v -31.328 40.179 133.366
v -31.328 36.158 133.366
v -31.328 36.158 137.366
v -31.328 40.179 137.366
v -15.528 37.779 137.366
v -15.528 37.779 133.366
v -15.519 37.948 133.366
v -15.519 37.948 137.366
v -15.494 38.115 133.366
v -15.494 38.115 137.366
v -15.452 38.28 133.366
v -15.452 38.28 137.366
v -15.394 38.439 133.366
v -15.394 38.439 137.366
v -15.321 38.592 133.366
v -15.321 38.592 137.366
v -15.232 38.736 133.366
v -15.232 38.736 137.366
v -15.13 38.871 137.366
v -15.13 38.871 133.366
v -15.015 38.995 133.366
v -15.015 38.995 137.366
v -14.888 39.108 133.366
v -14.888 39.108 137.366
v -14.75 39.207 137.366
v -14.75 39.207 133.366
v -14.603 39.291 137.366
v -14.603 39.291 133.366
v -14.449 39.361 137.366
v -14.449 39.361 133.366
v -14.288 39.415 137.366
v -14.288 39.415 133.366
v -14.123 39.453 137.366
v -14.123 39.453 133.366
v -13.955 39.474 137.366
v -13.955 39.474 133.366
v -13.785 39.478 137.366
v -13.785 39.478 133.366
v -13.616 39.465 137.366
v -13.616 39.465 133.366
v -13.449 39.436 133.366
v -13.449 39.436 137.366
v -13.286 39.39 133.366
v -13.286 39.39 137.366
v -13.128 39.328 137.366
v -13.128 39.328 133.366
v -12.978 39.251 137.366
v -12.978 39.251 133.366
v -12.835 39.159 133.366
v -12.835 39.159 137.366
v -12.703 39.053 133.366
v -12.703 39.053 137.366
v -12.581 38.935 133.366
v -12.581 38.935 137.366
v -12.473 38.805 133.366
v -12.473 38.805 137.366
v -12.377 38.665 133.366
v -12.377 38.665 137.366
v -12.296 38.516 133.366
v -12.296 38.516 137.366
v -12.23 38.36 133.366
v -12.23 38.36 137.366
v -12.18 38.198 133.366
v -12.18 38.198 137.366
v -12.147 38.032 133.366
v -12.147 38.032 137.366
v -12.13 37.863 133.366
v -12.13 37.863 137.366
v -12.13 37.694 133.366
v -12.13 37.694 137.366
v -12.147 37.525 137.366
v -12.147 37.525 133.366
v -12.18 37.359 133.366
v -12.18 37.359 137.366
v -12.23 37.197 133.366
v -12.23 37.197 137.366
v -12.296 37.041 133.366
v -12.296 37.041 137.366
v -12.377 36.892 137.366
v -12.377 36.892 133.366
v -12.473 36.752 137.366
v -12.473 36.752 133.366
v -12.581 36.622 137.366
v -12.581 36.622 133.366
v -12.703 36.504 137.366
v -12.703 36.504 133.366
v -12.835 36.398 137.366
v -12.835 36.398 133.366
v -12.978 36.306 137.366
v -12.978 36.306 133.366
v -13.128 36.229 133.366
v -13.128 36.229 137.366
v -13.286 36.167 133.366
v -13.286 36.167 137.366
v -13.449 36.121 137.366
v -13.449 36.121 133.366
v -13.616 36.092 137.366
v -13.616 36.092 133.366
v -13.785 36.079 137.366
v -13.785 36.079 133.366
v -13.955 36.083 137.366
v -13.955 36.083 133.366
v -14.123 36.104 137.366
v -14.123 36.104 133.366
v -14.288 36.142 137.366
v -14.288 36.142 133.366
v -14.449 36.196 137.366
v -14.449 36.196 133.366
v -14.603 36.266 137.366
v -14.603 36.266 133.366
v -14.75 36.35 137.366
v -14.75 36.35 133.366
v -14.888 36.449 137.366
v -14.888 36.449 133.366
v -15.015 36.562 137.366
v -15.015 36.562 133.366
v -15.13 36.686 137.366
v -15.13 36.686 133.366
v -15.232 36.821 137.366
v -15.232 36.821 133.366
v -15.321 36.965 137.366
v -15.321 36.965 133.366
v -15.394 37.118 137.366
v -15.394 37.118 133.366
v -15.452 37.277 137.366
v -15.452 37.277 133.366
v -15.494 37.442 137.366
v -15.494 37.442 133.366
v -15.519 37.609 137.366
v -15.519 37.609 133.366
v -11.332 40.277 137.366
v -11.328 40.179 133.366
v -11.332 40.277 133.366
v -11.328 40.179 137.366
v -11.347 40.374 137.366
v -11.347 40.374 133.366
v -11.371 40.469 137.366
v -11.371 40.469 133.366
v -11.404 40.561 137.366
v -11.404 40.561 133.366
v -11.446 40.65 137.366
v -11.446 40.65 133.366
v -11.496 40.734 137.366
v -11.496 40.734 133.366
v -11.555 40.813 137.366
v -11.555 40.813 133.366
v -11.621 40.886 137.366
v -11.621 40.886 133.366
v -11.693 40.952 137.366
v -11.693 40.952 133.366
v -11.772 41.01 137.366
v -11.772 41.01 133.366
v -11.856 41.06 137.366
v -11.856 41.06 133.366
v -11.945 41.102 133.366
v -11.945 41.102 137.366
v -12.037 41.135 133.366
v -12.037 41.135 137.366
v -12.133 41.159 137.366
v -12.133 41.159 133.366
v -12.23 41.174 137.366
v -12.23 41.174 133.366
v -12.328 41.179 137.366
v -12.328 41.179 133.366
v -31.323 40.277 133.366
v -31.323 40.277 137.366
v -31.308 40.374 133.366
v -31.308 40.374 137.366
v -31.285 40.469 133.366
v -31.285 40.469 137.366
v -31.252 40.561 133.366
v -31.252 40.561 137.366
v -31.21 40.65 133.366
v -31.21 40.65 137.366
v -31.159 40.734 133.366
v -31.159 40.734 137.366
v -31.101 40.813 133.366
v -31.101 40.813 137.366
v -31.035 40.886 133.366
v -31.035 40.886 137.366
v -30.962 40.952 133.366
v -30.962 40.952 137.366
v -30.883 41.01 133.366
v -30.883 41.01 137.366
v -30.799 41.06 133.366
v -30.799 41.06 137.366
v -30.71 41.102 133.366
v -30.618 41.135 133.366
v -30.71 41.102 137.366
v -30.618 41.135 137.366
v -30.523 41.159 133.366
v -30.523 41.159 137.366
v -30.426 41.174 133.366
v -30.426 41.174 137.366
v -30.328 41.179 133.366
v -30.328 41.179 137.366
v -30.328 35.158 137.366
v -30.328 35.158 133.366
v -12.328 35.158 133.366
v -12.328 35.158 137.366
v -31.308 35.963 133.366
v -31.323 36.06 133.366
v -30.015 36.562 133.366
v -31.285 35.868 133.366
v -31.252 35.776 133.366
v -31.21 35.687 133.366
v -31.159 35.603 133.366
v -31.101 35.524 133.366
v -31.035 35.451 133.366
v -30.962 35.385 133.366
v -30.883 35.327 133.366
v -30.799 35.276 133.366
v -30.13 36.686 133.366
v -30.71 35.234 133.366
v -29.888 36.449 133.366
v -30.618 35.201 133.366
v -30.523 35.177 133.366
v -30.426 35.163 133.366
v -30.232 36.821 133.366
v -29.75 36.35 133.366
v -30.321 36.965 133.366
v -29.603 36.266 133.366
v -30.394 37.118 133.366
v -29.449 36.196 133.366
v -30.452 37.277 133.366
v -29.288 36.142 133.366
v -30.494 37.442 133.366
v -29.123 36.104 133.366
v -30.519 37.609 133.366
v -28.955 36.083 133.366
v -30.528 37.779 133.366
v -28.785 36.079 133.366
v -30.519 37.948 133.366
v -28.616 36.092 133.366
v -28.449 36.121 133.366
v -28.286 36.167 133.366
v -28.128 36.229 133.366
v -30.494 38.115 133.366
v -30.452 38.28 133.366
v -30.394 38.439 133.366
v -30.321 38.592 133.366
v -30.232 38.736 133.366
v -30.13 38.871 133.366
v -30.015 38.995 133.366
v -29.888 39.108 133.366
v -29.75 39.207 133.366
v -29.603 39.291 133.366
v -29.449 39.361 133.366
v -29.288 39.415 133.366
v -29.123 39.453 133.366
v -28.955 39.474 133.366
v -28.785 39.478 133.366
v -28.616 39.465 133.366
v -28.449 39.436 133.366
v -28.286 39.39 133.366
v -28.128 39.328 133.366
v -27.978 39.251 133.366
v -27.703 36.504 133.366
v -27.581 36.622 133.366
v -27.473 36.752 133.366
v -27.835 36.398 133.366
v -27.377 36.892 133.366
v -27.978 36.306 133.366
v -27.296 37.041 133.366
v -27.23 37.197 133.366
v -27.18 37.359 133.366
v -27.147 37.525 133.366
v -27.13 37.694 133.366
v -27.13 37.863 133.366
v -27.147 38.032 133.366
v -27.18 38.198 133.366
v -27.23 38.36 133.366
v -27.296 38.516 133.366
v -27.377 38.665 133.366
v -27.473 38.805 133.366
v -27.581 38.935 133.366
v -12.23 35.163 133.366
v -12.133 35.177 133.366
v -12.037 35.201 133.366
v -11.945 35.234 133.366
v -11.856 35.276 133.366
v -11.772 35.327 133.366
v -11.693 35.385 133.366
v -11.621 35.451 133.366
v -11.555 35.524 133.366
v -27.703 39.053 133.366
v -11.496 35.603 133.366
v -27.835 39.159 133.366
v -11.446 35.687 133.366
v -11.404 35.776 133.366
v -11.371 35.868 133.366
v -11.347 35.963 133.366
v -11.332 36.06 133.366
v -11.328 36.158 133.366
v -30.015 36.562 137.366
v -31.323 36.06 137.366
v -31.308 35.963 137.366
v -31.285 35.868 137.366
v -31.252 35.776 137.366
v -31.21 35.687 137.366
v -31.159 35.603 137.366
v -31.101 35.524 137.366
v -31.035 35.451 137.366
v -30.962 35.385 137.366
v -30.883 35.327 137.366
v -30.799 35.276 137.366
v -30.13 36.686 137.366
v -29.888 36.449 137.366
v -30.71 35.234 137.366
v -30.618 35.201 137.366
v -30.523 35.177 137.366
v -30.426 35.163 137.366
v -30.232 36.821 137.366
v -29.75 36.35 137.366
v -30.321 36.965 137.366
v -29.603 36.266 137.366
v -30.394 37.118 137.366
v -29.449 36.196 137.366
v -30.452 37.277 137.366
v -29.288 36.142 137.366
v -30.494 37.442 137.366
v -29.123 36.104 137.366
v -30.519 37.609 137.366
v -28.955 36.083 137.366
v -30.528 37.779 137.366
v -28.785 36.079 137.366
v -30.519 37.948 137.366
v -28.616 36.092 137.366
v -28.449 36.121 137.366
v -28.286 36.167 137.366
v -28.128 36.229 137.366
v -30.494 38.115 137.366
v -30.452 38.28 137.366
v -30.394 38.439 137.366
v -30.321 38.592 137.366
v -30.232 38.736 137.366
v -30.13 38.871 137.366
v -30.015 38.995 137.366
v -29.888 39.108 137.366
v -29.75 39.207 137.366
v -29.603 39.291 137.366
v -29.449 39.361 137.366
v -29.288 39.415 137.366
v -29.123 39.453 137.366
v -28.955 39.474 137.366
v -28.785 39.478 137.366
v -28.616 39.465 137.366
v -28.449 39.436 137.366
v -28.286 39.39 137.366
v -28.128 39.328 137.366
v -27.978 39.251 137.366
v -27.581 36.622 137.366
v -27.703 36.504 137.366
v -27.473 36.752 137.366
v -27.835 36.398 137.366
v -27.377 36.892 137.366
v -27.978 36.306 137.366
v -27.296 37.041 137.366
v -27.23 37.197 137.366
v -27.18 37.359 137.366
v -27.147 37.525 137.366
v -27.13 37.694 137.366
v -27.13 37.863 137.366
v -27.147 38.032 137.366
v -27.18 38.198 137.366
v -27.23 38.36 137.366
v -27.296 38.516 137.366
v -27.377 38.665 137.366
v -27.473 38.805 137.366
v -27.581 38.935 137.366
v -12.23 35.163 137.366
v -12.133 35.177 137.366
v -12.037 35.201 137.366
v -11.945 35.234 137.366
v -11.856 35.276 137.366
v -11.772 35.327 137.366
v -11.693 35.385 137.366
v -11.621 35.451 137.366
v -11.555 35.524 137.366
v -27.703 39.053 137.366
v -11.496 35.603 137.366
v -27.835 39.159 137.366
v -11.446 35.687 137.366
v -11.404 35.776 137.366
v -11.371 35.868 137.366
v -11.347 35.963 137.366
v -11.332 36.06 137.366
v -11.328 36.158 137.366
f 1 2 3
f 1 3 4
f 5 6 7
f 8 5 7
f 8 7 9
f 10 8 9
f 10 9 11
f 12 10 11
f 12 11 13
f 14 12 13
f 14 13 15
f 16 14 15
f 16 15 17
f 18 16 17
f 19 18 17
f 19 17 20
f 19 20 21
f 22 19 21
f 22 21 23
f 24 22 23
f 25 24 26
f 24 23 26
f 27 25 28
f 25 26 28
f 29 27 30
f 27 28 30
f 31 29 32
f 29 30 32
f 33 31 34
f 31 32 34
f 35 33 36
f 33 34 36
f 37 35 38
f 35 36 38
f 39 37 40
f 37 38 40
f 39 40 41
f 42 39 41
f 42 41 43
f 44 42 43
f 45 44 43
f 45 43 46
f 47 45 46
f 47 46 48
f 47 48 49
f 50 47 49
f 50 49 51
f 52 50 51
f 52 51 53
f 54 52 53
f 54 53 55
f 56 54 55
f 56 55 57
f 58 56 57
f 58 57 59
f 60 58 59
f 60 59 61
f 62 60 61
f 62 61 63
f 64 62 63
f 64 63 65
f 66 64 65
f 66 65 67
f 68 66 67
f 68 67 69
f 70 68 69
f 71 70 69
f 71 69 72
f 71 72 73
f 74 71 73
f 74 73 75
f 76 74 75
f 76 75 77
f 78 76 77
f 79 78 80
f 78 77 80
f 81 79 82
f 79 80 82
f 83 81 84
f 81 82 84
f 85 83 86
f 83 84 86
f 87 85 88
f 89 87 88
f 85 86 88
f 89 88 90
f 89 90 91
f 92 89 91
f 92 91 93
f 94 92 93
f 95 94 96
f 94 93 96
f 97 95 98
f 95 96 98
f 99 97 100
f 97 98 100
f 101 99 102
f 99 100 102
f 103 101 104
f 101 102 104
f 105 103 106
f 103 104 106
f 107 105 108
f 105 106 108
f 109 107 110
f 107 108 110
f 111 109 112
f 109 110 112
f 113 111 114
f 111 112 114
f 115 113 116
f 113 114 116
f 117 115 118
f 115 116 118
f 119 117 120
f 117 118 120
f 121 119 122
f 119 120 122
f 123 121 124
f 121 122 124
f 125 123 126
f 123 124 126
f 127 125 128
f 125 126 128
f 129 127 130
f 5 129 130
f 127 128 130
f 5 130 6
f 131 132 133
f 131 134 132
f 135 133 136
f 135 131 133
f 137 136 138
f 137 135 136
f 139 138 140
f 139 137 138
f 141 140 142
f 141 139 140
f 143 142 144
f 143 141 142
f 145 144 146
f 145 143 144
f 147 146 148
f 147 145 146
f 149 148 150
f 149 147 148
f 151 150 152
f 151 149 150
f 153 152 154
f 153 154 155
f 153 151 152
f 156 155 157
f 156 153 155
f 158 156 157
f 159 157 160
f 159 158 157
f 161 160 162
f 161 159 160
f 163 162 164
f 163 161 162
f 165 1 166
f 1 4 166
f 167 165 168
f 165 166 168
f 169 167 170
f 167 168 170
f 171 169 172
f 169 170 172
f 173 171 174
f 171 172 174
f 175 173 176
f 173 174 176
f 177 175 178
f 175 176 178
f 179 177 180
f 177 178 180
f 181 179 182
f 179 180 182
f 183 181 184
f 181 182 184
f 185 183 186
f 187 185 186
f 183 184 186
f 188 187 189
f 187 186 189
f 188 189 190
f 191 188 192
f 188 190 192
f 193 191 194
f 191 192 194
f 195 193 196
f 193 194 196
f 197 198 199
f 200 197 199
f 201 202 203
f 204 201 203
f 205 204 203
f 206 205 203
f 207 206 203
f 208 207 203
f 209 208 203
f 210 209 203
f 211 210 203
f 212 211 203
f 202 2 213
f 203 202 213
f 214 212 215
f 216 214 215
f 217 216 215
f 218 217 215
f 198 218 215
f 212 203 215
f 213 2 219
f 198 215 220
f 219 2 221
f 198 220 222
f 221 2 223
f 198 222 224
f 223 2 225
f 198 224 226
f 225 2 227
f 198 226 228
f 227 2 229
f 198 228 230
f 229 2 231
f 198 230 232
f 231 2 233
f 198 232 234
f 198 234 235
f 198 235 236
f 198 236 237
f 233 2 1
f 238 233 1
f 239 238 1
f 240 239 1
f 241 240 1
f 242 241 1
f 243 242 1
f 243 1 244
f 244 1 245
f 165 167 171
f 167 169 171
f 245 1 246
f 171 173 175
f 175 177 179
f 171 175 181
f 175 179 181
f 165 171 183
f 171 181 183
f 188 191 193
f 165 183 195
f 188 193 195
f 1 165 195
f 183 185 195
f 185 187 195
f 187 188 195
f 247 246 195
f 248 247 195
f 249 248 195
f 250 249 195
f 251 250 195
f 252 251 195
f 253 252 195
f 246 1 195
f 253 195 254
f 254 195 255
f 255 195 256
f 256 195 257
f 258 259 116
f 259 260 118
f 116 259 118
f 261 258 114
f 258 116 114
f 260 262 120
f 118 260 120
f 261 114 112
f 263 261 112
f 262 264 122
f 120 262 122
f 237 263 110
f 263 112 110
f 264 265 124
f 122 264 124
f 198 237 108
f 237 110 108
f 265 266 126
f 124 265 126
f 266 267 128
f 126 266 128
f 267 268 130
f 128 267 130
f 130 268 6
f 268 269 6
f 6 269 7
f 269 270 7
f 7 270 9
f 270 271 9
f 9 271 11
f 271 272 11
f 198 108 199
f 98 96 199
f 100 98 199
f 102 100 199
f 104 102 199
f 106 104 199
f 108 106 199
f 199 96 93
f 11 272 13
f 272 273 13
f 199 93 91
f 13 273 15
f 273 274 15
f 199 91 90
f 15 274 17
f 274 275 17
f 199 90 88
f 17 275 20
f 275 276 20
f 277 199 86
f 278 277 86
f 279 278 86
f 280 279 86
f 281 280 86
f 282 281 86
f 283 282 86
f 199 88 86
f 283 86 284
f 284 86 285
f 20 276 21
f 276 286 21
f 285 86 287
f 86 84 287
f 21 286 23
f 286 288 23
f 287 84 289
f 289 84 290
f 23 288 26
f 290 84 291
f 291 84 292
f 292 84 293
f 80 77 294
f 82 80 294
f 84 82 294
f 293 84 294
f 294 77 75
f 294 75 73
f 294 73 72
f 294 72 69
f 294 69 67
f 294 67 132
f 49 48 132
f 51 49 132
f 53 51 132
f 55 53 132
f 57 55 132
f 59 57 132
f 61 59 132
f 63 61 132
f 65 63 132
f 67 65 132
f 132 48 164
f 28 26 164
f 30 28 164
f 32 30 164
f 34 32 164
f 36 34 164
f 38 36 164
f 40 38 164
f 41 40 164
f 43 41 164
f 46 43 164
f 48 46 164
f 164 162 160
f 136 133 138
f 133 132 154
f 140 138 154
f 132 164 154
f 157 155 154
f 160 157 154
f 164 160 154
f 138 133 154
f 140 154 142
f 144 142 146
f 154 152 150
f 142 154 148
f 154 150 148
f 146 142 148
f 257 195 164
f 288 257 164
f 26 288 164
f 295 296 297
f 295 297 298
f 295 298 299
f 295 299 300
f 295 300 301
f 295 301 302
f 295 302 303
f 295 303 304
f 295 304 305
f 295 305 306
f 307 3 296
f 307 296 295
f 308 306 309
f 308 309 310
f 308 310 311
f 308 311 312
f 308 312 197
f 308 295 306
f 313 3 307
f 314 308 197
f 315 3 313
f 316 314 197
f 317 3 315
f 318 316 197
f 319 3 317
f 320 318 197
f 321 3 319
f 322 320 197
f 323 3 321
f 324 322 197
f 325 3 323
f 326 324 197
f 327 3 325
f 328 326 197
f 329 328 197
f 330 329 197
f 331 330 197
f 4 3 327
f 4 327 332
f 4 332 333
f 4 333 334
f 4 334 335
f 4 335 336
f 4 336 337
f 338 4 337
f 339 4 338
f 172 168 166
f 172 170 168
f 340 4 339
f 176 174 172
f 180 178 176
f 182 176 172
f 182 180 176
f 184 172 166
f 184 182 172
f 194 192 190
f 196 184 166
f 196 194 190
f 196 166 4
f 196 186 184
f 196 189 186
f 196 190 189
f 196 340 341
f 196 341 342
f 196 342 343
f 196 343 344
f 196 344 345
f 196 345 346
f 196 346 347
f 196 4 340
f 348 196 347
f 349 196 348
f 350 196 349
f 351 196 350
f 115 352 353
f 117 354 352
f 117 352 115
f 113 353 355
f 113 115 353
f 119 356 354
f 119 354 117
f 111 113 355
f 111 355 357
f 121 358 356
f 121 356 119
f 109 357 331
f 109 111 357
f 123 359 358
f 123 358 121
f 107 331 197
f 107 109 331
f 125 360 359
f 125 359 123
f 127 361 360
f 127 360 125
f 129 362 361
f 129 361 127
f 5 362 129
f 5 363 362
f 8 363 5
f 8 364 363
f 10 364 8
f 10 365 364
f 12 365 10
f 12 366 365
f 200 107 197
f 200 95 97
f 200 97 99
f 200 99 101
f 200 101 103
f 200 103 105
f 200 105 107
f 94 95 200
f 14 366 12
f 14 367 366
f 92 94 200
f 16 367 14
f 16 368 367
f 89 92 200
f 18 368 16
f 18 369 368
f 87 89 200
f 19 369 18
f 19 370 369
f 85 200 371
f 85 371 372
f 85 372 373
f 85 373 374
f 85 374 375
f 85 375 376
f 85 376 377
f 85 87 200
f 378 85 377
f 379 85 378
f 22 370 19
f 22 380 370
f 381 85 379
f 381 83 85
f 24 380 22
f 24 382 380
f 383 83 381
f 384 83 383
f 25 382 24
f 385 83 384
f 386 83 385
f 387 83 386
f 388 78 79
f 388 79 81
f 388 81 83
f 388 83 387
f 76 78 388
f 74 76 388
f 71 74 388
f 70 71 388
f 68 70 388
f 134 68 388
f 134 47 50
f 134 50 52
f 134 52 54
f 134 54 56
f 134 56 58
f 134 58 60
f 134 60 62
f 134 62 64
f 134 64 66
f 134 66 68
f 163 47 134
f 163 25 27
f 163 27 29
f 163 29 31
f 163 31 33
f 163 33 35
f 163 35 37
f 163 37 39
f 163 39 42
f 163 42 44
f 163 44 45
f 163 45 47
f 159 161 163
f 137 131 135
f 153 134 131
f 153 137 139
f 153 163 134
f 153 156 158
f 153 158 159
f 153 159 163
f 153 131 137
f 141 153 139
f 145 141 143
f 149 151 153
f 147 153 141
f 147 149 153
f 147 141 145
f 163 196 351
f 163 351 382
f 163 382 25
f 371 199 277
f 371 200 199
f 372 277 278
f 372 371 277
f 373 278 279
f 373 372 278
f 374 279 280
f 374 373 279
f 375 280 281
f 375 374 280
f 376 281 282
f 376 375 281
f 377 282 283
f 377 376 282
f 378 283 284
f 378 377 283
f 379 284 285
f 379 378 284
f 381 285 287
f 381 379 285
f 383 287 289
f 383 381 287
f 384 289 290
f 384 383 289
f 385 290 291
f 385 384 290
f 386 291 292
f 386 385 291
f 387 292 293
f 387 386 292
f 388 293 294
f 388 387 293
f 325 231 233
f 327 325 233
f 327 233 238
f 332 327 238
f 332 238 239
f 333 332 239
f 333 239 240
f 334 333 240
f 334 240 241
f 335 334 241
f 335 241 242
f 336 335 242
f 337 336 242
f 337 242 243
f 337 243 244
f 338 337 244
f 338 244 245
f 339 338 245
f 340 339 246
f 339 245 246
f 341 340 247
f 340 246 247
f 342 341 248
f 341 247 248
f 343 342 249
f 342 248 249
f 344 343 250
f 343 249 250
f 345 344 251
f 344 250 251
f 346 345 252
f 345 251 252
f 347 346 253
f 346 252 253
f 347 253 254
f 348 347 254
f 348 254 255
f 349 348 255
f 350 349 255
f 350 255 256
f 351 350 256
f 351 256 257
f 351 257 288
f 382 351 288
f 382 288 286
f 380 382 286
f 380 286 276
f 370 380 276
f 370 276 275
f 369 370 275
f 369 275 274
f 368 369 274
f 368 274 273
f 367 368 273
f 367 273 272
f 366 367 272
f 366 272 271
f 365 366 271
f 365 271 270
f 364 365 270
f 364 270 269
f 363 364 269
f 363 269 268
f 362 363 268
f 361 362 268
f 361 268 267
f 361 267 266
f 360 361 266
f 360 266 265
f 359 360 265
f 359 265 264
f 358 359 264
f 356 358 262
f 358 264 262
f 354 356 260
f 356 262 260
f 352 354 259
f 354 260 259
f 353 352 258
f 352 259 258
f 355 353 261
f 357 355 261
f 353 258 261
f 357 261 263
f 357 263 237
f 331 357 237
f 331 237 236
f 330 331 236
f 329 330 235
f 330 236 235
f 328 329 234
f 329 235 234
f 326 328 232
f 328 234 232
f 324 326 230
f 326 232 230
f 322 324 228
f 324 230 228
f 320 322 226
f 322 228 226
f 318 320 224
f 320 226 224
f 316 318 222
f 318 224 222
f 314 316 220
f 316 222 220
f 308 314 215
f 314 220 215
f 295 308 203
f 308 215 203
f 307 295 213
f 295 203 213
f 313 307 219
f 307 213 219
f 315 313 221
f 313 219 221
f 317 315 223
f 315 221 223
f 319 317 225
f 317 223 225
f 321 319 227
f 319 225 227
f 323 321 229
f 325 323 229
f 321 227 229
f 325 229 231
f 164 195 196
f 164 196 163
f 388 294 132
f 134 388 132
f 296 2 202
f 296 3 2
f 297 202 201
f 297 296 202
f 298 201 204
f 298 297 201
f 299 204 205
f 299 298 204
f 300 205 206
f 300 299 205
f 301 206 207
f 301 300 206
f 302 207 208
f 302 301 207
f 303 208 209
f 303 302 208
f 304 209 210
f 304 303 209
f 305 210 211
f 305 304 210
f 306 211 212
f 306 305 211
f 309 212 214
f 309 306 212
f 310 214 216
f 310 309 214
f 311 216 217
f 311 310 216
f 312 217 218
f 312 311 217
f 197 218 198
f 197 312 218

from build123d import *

# Parameters (mm, degrees)
SKETCH2_W                = 20
SKETCH2_H                = 6.020278893
BOSS_EXTRUDE1_DEPTH      = 4
FILLET1_R                = 1
M3_CLEARANCE_HOLE1_D     = 3.4
M3_CLEARANCE_HOLE1_DEPTH = 16.5
M3_CLEARANCE_HOLE1_TIP   = 1.021463052


with BuildPart() as part:
    # Sketch2 → Boss-Extrude1 (new body)
    with BuildSketch(Plane.XY.offset(133.365661293)):
        with Locations((-21.327645728, 38.168378797)):
            Rectangle(SKETCH2_W, SKETCH2_H)
    extrude(amount=BOSS_EXTRUDE1_DEPTH)

    # Fillet1
    fillet1_edges = [part.edges().sort_by_distance(p)[0] for p in [
        (-31.327645728, 41.178518244, 135.365661293),
        (-11.327645728, 41.178518244, 135.365661293),
        (-11.327645728, 35.158239351, 135.365661293),
        (-31.327645728, 35.158239351, 135.365661293),
    ]]
    fillet(fillet1_edges, radius=FILLET1_R)

    # M3 Clearance Hole1
    with Locations(Plane.XY.offset(137.365661293)):
        with Locations((-28.827645728, 37.778518244), (-13.827645728, 37.778518244)):
            Hole(M3_CLEARANCE_HOLE1_D / 2, depth=M3_CLEARANCE_HOLE1_DEPTH)
            with Locations((0, 0, -(M3_CLEARANCE_HOLE1_DEPTH + M3_CLEARANCE_HOLE1_TIP / 2))):  # 118° drill point
                Cone(0, M3_CLEARANCE_HOLE1_D / 2, M3_CLEARANCE_HOLE1_TIP, mode=Mode.SUBTRACT)


solid = part.part
